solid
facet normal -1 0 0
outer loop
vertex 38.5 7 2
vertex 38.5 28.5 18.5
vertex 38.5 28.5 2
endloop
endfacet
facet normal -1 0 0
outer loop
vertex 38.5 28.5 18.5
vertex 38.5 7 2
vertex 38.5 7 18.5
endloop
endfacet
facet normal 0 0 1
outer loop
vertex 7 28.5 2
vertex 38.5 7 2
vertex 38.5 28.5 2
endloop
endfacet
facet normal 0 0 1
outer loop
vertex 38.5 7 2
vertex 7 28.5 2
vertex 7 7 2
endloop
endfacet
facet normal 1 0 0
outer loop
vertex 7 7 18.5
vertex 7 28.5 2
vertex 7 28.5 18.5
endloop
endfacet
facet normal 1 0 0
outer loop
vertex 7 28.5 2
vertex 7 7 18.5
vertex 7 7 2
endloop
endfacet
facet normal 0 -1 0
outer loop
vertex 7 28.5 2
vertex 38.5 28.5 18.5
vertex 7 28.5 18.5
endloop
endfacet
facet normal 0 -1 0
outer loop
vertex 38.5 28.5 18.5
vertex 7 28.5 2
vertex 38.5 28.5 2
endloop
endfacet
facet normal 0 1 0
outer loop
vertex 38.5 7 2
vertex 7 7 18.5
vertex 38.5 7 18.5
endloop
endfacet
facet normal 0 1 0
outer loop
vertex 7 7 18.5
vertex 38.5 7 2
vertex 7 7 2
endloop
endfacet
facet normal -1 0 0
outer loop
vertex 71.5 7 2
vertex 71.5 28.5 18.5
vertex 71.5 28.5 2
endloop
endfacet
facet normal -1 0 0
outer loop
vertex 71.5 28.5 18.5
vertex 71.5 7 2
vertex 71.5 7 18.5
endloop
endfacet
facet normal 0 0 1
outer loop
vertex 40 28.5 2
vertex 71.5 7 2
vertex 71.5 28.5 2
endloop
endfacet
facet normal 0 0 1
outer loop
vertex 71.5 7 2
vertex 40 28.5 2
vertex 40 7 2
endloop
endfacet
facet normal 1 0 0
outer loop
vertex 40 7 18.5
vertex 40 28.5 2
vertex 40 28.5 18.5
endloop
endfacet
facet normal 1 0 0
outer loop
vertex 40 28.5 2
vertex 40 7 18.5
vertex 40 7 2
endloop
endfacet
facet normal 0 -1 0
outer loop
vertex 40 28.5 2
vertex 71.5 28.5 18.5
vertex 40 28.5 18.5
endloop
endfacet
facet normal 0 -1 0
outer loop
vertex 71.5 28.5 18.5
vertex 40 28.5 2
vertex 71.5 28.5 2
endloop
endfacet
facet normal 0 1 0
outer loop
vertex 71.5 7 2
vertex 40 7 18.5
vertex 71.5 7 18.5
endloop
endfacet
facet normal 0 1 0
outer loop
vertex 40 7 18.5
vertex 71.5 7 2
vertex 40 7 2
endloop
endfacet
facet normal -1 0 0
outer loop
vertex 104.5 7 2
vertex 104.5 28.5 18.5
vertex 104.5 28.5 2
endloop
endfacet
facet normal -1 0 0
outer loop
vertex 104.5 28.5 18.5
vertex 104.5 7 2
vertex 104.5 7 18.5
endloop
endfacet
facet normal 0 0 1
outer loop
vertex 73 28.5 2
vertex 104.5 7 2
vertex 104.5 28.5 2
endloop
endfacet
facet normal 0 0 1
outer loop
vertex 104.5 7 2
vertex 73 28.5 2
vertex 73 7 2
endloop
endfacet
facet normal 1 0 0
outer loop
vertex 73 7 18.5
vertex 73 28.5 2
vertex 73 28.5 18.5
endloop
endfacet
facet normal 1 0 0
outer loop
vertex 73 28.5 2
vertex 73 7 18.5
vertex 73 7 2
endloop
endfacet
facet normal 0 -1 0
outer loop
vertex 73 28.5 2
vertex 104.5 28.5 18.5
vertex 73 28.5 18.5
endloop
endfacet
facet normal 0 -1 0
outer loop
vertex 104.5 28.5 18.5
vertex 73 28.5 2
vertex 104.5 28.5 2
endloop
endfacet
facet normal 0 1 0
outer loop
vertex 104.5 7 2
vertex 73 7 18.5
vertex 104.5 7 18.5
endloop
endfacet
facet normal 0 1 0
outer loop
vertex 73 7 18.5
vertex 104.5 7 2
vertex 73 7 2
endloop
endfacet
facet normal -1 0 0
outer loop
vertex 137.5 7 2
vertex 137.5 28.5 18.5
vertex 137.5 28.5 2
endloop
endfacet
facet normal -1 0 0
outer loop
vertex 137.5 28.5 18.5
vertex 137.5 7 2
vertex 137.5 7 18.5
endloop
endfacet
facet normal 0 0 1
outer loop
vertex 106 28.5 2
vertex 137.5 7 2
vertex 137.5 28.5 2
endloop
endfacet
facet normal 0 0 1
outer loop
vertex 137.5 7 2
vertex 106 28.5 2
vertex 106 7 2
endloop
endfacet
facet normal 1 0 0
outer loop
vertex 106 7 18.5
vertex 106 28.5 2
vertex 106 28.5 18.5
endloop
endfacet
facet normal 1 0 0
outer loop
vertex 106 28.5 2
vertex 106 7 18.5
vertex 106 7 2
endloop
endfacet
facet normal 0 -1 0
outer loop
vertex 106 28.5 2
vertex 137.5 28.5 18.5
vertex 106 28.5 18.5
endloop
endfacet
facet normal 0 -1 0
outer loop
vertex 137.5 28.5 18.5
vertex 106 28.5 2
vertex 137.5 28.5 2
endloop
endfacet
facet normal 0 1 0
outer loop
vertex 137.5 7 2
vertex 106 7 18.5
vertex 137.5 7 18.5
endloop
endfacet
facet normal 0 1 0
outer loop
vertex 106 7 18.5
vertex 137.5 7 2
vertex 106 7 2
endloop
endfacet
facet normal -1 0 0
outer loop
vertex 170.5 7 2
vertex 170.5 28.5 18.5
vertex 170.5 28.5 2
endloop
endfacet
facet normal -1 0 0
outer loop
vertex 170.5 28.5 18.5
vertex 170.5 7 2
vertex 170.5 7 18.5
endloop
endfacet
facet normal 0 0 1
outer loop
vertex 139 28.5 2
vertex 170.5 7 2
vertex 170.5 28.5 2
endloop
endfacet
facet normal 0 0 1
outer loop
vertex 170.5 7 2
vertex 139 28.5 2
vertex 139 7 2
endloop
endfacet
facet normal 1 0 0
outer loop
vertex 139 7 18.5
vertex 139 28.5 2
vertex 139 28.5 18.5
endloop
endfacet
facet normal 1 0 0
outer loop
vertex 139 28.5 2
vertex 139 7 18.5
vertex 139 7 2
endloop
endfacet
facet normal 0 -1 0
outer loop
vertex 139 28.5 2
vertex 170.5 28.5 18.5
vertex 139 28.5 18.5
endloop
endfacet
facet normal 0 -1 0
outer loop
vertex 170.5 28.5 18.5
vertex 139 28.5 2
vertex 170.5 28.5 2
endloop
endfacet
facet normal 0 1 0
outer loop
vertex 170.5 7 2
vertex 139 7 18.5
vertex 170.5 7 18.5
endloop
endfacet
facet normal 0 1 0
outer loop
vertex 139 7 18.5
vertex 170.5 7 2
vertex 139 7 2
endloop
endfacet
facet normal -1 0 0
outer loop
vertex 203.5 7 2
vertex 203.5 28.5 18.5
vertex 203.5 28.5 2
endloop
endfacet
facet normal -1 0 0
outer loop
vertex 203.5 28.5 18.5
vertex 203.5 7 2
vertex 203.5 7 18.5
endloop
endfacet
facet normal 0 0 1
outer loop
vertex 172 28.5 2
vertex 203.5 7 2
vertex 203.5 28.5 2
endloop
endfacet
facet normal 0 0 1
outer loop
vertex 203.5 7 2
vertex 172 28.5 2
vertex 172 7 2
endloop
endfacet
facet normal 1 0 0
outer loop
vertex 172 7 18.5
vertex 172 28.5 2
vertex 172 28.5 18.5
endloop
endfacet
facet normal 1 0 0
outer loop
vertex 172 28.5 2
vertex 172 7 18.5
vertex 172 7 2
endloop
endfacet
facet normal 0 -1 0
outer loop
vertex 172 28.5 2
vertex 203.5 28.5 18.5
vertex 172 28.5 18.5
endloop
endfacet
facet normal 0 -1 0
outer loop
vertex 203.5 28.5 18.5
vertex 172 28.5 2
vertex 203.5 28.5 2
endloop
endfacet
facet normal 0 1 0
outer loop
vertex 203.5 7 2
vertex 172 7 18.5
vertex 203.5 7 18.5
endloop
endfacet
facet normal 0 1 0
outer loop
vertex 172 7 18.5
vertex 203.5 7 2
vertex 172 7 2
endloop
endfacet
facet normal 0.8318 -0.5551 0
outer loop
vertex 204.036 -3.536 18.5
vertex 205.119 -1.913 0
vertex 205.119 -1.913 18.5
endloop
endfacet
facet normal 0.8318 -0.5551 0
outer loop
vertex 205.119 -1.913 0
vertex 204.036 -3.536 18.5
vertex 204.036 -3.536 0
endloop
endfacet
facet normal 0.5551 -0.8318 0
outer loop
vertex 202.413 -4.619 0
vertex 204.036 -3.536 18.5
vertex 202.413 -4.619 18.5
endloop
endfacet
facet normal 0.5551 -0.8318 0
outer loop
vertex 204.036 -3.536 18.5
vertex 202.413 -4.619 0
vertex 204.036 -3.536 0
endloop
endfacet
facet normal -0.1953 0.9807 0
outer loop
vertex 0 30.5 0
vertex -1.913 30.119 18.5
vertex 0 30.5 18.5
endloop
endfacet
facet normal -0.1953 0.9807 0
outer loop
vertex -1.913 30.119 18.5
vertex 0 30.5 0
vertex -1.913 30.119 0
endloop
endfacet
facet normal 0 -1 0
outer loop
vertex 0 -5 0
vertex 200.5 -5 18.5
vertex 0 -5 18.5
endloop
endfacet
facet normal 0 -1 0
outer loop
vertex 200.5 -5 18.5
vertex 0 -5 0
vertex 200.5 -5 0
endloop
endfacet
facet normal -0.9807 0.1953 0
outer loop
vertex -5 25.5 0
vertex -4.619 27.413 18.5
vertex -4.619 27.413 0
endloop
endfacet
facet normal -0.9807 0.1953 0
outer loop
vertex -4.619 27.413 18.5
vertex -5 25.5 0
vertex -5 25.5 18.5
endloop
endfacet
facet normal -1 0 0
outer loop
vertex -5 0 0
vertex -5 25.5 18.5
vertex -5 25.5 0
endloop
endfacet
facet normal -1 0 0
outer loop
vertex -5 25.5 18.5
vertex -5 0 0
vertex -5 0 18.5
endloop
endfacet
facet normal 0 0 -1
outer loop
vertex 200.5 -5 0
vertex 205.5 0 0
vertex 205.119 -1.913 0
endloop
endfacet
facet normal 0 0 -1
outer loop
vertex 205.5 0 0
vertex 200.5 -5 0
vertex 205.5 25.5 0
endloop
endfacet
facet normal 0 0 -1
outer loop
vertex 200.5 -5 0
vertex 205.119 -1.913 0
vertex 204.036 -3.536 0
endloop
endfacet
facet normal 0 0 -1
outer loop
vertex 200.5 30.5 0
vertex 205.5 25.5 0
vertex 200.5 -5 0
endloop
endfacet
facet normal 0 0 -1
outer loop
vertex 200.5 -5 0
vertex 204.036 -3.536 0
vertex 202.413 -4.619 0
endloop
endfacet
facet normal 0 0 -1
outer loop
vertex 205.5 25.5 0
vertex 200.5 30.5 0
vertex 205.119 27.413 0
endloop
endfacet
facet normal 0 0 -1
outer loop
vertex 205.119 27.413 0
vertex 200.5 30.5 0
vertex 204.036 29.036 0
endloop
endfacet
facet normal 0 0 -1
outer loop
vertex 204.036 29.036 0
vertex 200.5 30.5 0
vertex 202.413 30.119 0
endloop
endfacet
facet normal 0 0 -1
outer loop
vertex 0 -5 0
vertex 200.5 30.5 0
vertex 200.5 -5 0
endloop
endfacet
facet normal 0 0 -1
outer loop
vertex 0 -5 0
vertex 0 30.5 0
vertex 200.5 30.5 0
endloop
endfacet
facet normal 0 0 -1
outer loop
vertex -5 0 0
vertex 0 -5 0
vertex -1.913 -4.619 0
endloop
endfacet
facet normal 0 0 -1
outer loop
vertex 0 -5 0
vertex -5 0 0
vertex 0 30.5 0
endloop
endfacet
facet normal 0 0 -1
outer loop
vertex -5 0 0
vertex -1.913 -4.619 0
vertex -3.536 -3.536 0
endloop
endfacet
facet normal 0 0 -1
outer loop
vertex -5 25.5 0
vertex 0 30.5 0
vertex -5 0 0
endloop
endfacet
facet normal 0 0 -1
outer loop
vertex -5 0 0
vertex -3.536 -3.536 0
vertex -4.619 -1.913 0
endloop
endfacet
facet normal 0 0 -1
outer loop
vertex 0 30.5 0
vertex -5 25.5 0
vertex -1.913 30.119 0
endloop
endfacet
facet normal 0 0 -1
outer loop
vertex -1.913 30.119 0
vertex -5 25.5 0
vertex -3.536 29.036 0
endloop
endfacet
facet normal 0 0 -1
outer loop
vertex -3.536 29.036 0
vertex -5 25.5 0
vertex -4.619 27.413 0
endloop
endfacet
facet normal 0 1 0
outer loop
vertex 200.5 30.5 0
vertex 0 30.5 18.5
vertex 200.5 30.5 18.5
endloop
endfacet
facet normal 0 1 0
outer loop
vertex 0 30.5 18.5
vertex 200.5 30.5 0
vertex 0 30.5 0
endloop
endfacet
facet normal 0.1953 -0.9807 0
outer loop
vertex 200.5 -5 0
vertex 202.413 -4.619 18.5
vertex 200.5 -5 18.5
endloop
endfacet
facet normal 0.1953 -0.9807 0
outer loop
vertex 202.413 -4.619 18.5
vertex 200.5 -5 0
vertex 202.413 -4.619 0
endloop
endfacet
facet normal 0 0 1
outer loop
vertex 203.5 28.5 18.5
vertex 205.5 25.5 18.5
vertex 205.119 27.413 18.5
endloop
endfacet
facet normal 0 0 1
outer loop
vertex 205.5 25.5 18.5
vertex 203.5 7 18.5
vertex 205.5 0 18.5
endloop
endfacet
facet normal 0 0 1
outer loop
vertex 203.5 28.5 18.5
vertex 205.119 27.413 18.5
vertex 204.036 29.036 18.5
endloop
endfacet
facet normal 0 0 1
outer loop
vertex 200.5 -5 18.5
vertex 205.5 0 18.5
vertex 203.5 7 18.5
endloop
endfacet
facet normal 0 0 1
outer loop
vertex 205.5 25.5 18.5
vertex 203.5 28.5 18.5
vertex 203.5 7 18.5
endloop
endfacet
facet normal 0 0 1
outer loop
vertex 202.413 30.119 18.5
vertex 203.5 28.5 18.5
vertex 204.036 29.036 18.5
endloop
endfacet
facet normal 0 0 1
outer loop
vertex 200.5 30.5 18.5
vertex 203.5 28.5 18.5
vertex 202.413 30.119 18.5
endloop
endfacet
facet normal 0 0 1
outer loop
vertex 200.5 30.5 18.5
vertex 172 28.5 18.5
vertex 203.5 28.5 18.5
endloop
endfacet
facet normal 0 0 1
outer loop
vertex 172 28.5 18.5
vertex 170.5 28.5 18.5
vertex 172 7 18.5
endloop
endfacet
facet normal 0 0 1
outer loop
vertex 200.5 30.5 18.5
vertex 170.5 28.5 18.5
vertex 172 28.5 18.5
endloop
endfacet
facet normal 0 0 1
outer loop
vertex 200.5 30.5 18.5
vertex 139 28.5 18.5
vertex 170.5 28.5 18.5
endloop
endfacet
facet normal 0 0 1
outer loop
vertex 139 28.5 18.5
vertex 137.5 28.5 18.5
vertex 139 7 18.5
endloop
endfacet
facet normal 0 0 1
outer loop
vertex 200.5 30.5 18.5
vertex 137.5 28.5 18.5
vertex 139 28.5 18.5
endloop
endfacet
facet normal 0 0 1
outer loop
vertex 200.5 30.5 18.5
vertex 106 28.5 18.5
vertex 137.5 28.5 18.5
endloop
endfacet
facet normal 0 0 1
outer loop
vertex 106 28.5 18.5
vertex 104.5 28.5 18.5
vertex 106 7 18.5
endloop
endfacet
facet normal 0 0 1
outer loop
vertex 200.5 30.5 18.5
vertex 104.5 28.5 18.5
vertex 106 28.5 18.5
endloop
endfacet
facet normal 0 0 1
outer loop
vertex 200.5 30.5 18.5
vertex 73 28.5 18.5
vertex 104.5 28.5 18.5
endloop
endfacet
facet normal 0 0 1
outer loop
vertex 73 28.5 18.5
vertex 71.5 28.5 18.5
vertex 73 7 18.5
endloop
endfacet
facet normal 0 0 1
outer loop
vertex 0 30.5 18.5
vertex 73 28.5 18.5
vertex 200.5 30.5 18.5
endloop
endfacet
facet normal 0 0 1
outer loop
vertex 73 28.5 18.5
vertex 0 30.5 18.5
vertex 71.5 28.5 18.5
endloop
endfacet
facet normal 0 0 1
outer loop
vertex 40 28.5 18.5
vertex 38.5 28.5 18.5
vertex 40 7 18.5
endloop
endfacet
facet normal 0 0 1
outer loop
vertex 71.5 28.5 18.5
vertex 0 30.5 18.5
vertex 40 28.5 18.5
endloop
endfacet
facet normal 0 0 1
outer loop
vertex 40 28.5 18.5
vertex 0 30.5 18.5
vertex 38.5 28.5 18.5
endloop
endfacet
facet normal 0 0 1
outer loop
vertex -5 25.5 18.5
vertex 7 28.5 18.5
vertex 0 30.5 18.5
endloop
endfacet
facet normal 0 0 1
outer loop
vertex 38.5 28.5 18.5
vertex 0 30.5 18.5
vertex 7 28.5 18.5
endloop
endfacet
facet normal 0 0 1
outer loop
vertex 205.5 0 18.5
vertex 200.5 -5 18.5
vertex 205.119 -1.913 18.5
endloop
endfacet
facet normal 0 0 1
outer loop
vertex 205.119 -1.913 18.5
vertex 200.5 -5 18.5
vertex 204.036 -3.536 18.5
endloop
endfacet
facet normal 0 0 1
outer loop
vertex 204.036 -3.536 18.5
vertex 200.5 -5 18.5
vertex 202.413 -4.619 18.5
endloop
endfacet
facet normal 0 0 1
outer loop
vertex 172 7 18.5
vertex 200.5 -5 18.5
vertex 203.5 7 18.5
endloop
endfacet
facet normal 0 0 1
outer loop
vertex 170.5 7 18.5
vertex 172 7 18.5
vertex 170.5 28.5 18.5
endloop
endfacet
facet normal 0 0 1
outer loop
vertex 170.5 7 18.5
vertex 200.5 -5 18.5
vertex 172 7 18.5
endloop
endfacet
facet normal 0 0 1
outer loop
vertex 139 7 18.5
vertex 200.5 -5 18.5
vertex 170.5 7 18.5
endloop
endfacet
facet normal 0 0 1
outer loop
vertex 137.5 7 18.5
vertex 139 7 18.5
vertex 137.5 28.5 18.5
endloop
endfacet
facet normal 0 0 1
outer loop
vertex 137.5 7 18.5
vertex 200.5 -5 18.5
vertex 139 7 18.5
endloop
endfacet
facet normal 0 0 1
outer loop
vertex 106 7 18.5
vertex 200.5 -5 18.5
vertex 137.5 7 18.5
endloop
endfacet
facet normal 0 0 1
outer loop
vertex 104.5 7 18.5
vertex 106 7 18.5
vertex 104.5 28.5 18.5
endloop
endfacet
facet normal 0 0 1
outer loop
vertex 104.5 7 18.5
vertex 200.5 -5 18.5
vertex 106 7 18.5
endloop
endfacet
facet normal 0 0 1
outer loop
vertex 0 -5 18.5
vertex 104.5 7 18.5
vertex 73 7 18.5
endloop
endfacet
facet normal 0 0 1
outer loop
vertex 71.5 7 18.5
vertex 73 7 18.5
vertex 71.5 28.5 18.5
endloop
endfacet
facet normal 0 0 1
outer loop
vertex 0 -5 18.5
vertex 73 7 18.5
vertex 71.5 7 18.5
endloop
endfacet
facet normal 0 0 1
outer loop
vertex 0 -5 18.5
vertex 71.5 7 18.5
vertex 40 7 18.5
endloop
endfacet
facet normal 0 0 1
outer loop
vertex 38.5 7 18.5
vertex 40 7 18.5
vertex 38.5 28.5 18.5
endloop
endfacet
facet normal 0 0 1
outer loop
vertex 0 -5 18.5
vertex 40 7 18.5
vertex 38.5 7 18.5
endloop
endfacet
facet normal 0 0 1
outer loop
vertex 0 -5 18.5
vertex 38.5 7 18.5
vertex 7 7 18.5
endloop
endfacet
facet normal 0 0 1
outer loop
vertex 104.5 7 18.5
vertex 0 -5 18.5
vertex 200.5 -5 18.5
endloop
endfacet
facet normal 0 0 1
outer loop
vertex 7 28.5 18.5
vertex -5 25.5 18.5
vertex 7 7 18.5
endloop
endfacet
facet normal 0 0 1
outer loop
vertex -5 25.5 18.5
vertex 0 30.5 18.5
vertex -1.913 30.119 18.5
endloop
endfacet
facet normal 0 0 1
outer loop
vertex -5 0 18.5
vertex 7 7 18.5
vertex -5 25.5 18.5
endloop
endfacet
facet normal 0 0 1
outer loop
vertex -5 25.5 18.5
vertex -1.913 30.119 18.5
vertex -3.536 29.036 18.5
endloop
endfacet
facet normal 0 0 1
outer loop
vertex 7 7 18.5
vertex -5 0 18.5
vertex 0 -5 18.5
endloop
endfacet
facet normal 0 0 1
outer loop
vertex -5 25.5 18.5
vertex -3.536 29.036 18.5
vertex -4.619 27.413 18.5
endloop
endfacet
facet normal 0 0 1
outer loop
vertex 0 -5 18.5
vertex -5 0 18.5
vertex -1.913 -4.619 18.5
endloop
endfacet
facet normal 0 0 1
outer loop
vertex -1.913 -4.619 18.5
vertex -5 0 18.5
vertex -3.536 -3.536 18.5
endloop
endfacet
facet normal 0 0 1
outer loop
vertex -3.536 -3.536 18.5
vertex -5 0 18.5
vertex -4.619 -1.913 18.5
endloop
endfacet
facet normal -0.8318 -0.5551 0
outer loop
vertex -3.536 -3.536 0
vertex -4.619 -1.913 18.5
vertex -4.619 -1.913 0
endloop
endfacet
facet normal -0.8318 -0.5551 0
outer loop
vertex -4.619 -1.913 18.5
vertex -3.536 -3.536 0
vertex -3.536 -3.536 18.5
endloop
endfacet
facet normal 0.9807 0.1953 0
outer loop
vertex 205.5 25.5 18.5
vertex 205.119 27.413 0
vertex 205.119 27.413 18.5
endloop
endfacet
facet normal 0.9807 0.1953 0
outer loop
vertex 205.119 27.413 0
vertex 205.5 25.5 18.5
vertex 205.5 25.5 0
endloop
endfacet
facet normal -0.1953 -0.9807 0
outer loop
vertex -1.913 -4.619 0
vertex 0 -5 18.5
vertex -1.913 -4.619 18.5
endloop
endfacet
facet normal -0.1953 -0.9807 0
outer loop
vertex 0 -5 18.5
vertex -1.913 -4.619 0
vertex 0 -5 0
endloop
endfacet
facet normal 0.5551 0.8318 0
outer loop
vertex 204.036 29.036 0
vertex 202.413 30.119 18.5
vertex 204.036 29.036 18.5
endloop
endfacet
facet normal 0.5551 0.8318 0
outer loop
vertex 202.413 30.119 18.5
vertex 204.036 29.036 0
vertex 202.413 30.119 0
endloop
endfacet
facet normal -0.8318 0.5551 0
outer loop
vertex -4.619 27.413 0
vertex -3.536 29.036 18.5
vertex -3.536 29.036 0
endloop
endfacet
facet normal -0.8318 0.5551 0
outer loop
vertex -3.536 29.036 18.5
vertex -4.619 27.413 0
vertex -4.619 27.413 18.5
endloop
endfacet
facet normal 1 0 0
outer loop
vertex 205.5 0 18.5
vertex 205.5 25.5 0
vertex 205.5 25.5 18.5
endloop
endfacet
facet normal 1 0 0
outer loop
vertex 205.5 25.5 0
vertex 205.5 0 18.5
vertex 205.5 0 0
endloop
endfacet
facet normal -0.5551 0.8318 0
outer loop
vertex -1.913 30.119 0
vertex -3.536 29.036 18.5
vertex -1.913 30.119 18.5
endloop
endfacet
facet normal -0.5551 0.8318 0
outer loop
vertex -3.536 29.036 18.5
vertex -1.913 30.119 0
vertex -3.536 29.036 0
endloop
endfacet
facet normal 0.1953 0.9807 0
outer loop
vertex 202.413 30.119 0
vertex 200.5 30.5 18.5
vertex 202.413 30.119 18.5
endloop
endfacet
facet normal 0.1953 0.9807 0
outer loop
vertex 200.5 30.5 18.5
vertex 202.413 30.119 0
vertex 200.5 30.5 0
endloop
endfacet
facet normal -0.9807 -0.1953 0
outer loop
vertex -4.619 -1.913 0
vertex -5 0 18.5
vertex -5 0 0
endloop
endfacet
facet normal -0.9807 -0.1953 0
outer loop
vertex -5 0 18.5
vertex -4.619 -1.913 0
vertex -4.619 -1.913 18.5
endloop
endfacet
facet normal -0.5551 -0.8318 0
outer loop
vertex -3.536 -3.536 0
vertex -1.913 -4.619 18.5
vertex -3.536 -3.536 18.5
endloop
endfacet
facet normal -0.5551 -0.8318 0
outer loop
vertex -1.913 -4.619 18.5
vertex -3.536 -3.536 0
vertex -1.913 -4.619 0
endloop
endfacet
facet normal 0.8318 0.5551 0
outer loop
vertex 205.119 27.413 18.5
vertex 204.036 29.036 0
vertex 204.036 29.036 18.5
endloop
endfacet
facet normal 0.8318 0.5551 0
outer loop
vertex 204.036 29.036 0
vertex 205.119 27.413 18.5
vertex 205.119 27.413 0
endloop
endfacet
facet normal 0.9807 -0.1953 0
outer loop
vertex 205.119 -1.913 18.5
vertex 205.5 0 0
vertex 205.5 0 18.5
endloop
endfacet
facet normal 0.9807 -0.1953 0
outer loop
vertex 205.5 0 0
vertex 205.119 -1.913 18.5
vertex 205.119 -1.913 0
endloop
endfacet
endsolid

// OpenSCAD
// Generated by SolidPython 1.1.3 on 2026-02-21 18:25:15


difference() {
	linear_extrude(height = 18.5000000000) {
		offset(r = 5.0000000000) {
			square(size = [200.5000000000, 25.5000000000]);
		}
	}
	union() {
		translate(v = [7.0000000000, 7.0000000000, 2.0000000000]) {
			cube(size = [31.5000000000, 21.5000000000, 16.5100000000]);
		}
		translate(v = [40.0000000000, 7.0000000000, 2.0000000000]) {
			cube(size = [31.5000000000, 21.5000000000, 16.5100000000]);
		}
		translate(v = [73.0000000000, 7.0000000000, 2.0000000000]) {
			cube(size = [31.5000000000, 21.5000000000, 16.5100000000]);
		}
		translate(v = [106.0000000000, 7.0000000000, 2.0000000000]) {
			cube(size = [31.5000000000, 21.5000000000, 16.5100000000]);
		}
		translate(v = [139.0000000000, 7.0000000000, 2.0000000000]) {
			cube(size = [31.5000000000, 21.5000000000, 16.5100000000]);
		}
		translate(v = [172.0000000000, 7.0000000000, 2.0000000000]) {
			cube(size = [31.5000000000, 21.5000000000, 16.5100000000]);
		}
	}
}
/***********************************************
*********      SolidPython code:      **********
************************************************
 
"""SolidPython geometry building for storage cases."""

from typing import List, Union

from solid import (
    cube,
    difference,
    linear_extrude,
    offset,
    scad_render_to_file,
    square,
    translate,
    union,
)

from .config import Config
from .layout import GridLayoutResult, MixedLayoutResult, SlotRect


def build_base_tray(
    slots: List[SlotRect],
    total_width: float,
    total_length: float,
    config: Config,
):
    """Build the solid base tray (floor + perimeter walls) with slot cavities subtracted."""
    wall = config.wall_thickness
    base_h = config.base_height
    max_height = max(s.height for s in slots)

    if config.case_size is not None:
        outer_x, outer_y = config.case_size
    outer_z = base_h + max_height
    r = config.corner_radius

    if config.case_size is not None:
        pass  # outer_x, outer_y already set
    else:
        corner_padding = 2 * r if r > 0 else 0
        outer_x = total_width + 2 * wall + corner_padding
        outer_y = total_length + 2 * wall + corner_padding

    if r > 0:
        # Round only outer corners in XY plane: 2D offset + linear_extrude
        base_2d = square([outer_x - 2 * r, outer_y - 2 * r])
        rounded_2d = offset(r=r)(base_2d)
        outer_box = linear_extrude(height=outer_z)(rounded_2d)
    else:
        outer_box = cube([outer_x, outer_y, outer_z])

    # Subtract each slot cavity (use uniform depth so all slots are clearly visible)
    # Inset by corner_radius so cavities don't cut into rounded corners
    cavity_inset = r if r > 0 else 0
    cavities = []
    for slot in slots:
        cavity = translate([wall + cavity_inset + slot.x, wall + cavity_inset + slot.y, base_h])(
            cube([slot.width, slot.length, max_height + 0.01])  # +epsilon for clean cut
        )
        cavities.append(cavity)

    if cavities:
        tray = difference()(outer_box, union()(*cavities))
    else:
        tray = outer_box

    return tray


def assemble_case(
    layout_result: Union[GridLayoutResult, MixedLayoutResult],
    config: Config,
):
    """Assemble the complete case: base tray with slot cavities (dividers are implicit)."""
    slots = layout_result.slots
    total_width = layout_result.total_width
    total_length = layout_result.total_length

    case = build_base_tray(slots, total_width, total_length, config)
    return case


def render_to_file(assembly, filepath: str) -> None:
    """Render the assembly to an OpenSCAD .scad file."""
    scad_render_to_file(assembly, filepath)
 
 
************************************************/
